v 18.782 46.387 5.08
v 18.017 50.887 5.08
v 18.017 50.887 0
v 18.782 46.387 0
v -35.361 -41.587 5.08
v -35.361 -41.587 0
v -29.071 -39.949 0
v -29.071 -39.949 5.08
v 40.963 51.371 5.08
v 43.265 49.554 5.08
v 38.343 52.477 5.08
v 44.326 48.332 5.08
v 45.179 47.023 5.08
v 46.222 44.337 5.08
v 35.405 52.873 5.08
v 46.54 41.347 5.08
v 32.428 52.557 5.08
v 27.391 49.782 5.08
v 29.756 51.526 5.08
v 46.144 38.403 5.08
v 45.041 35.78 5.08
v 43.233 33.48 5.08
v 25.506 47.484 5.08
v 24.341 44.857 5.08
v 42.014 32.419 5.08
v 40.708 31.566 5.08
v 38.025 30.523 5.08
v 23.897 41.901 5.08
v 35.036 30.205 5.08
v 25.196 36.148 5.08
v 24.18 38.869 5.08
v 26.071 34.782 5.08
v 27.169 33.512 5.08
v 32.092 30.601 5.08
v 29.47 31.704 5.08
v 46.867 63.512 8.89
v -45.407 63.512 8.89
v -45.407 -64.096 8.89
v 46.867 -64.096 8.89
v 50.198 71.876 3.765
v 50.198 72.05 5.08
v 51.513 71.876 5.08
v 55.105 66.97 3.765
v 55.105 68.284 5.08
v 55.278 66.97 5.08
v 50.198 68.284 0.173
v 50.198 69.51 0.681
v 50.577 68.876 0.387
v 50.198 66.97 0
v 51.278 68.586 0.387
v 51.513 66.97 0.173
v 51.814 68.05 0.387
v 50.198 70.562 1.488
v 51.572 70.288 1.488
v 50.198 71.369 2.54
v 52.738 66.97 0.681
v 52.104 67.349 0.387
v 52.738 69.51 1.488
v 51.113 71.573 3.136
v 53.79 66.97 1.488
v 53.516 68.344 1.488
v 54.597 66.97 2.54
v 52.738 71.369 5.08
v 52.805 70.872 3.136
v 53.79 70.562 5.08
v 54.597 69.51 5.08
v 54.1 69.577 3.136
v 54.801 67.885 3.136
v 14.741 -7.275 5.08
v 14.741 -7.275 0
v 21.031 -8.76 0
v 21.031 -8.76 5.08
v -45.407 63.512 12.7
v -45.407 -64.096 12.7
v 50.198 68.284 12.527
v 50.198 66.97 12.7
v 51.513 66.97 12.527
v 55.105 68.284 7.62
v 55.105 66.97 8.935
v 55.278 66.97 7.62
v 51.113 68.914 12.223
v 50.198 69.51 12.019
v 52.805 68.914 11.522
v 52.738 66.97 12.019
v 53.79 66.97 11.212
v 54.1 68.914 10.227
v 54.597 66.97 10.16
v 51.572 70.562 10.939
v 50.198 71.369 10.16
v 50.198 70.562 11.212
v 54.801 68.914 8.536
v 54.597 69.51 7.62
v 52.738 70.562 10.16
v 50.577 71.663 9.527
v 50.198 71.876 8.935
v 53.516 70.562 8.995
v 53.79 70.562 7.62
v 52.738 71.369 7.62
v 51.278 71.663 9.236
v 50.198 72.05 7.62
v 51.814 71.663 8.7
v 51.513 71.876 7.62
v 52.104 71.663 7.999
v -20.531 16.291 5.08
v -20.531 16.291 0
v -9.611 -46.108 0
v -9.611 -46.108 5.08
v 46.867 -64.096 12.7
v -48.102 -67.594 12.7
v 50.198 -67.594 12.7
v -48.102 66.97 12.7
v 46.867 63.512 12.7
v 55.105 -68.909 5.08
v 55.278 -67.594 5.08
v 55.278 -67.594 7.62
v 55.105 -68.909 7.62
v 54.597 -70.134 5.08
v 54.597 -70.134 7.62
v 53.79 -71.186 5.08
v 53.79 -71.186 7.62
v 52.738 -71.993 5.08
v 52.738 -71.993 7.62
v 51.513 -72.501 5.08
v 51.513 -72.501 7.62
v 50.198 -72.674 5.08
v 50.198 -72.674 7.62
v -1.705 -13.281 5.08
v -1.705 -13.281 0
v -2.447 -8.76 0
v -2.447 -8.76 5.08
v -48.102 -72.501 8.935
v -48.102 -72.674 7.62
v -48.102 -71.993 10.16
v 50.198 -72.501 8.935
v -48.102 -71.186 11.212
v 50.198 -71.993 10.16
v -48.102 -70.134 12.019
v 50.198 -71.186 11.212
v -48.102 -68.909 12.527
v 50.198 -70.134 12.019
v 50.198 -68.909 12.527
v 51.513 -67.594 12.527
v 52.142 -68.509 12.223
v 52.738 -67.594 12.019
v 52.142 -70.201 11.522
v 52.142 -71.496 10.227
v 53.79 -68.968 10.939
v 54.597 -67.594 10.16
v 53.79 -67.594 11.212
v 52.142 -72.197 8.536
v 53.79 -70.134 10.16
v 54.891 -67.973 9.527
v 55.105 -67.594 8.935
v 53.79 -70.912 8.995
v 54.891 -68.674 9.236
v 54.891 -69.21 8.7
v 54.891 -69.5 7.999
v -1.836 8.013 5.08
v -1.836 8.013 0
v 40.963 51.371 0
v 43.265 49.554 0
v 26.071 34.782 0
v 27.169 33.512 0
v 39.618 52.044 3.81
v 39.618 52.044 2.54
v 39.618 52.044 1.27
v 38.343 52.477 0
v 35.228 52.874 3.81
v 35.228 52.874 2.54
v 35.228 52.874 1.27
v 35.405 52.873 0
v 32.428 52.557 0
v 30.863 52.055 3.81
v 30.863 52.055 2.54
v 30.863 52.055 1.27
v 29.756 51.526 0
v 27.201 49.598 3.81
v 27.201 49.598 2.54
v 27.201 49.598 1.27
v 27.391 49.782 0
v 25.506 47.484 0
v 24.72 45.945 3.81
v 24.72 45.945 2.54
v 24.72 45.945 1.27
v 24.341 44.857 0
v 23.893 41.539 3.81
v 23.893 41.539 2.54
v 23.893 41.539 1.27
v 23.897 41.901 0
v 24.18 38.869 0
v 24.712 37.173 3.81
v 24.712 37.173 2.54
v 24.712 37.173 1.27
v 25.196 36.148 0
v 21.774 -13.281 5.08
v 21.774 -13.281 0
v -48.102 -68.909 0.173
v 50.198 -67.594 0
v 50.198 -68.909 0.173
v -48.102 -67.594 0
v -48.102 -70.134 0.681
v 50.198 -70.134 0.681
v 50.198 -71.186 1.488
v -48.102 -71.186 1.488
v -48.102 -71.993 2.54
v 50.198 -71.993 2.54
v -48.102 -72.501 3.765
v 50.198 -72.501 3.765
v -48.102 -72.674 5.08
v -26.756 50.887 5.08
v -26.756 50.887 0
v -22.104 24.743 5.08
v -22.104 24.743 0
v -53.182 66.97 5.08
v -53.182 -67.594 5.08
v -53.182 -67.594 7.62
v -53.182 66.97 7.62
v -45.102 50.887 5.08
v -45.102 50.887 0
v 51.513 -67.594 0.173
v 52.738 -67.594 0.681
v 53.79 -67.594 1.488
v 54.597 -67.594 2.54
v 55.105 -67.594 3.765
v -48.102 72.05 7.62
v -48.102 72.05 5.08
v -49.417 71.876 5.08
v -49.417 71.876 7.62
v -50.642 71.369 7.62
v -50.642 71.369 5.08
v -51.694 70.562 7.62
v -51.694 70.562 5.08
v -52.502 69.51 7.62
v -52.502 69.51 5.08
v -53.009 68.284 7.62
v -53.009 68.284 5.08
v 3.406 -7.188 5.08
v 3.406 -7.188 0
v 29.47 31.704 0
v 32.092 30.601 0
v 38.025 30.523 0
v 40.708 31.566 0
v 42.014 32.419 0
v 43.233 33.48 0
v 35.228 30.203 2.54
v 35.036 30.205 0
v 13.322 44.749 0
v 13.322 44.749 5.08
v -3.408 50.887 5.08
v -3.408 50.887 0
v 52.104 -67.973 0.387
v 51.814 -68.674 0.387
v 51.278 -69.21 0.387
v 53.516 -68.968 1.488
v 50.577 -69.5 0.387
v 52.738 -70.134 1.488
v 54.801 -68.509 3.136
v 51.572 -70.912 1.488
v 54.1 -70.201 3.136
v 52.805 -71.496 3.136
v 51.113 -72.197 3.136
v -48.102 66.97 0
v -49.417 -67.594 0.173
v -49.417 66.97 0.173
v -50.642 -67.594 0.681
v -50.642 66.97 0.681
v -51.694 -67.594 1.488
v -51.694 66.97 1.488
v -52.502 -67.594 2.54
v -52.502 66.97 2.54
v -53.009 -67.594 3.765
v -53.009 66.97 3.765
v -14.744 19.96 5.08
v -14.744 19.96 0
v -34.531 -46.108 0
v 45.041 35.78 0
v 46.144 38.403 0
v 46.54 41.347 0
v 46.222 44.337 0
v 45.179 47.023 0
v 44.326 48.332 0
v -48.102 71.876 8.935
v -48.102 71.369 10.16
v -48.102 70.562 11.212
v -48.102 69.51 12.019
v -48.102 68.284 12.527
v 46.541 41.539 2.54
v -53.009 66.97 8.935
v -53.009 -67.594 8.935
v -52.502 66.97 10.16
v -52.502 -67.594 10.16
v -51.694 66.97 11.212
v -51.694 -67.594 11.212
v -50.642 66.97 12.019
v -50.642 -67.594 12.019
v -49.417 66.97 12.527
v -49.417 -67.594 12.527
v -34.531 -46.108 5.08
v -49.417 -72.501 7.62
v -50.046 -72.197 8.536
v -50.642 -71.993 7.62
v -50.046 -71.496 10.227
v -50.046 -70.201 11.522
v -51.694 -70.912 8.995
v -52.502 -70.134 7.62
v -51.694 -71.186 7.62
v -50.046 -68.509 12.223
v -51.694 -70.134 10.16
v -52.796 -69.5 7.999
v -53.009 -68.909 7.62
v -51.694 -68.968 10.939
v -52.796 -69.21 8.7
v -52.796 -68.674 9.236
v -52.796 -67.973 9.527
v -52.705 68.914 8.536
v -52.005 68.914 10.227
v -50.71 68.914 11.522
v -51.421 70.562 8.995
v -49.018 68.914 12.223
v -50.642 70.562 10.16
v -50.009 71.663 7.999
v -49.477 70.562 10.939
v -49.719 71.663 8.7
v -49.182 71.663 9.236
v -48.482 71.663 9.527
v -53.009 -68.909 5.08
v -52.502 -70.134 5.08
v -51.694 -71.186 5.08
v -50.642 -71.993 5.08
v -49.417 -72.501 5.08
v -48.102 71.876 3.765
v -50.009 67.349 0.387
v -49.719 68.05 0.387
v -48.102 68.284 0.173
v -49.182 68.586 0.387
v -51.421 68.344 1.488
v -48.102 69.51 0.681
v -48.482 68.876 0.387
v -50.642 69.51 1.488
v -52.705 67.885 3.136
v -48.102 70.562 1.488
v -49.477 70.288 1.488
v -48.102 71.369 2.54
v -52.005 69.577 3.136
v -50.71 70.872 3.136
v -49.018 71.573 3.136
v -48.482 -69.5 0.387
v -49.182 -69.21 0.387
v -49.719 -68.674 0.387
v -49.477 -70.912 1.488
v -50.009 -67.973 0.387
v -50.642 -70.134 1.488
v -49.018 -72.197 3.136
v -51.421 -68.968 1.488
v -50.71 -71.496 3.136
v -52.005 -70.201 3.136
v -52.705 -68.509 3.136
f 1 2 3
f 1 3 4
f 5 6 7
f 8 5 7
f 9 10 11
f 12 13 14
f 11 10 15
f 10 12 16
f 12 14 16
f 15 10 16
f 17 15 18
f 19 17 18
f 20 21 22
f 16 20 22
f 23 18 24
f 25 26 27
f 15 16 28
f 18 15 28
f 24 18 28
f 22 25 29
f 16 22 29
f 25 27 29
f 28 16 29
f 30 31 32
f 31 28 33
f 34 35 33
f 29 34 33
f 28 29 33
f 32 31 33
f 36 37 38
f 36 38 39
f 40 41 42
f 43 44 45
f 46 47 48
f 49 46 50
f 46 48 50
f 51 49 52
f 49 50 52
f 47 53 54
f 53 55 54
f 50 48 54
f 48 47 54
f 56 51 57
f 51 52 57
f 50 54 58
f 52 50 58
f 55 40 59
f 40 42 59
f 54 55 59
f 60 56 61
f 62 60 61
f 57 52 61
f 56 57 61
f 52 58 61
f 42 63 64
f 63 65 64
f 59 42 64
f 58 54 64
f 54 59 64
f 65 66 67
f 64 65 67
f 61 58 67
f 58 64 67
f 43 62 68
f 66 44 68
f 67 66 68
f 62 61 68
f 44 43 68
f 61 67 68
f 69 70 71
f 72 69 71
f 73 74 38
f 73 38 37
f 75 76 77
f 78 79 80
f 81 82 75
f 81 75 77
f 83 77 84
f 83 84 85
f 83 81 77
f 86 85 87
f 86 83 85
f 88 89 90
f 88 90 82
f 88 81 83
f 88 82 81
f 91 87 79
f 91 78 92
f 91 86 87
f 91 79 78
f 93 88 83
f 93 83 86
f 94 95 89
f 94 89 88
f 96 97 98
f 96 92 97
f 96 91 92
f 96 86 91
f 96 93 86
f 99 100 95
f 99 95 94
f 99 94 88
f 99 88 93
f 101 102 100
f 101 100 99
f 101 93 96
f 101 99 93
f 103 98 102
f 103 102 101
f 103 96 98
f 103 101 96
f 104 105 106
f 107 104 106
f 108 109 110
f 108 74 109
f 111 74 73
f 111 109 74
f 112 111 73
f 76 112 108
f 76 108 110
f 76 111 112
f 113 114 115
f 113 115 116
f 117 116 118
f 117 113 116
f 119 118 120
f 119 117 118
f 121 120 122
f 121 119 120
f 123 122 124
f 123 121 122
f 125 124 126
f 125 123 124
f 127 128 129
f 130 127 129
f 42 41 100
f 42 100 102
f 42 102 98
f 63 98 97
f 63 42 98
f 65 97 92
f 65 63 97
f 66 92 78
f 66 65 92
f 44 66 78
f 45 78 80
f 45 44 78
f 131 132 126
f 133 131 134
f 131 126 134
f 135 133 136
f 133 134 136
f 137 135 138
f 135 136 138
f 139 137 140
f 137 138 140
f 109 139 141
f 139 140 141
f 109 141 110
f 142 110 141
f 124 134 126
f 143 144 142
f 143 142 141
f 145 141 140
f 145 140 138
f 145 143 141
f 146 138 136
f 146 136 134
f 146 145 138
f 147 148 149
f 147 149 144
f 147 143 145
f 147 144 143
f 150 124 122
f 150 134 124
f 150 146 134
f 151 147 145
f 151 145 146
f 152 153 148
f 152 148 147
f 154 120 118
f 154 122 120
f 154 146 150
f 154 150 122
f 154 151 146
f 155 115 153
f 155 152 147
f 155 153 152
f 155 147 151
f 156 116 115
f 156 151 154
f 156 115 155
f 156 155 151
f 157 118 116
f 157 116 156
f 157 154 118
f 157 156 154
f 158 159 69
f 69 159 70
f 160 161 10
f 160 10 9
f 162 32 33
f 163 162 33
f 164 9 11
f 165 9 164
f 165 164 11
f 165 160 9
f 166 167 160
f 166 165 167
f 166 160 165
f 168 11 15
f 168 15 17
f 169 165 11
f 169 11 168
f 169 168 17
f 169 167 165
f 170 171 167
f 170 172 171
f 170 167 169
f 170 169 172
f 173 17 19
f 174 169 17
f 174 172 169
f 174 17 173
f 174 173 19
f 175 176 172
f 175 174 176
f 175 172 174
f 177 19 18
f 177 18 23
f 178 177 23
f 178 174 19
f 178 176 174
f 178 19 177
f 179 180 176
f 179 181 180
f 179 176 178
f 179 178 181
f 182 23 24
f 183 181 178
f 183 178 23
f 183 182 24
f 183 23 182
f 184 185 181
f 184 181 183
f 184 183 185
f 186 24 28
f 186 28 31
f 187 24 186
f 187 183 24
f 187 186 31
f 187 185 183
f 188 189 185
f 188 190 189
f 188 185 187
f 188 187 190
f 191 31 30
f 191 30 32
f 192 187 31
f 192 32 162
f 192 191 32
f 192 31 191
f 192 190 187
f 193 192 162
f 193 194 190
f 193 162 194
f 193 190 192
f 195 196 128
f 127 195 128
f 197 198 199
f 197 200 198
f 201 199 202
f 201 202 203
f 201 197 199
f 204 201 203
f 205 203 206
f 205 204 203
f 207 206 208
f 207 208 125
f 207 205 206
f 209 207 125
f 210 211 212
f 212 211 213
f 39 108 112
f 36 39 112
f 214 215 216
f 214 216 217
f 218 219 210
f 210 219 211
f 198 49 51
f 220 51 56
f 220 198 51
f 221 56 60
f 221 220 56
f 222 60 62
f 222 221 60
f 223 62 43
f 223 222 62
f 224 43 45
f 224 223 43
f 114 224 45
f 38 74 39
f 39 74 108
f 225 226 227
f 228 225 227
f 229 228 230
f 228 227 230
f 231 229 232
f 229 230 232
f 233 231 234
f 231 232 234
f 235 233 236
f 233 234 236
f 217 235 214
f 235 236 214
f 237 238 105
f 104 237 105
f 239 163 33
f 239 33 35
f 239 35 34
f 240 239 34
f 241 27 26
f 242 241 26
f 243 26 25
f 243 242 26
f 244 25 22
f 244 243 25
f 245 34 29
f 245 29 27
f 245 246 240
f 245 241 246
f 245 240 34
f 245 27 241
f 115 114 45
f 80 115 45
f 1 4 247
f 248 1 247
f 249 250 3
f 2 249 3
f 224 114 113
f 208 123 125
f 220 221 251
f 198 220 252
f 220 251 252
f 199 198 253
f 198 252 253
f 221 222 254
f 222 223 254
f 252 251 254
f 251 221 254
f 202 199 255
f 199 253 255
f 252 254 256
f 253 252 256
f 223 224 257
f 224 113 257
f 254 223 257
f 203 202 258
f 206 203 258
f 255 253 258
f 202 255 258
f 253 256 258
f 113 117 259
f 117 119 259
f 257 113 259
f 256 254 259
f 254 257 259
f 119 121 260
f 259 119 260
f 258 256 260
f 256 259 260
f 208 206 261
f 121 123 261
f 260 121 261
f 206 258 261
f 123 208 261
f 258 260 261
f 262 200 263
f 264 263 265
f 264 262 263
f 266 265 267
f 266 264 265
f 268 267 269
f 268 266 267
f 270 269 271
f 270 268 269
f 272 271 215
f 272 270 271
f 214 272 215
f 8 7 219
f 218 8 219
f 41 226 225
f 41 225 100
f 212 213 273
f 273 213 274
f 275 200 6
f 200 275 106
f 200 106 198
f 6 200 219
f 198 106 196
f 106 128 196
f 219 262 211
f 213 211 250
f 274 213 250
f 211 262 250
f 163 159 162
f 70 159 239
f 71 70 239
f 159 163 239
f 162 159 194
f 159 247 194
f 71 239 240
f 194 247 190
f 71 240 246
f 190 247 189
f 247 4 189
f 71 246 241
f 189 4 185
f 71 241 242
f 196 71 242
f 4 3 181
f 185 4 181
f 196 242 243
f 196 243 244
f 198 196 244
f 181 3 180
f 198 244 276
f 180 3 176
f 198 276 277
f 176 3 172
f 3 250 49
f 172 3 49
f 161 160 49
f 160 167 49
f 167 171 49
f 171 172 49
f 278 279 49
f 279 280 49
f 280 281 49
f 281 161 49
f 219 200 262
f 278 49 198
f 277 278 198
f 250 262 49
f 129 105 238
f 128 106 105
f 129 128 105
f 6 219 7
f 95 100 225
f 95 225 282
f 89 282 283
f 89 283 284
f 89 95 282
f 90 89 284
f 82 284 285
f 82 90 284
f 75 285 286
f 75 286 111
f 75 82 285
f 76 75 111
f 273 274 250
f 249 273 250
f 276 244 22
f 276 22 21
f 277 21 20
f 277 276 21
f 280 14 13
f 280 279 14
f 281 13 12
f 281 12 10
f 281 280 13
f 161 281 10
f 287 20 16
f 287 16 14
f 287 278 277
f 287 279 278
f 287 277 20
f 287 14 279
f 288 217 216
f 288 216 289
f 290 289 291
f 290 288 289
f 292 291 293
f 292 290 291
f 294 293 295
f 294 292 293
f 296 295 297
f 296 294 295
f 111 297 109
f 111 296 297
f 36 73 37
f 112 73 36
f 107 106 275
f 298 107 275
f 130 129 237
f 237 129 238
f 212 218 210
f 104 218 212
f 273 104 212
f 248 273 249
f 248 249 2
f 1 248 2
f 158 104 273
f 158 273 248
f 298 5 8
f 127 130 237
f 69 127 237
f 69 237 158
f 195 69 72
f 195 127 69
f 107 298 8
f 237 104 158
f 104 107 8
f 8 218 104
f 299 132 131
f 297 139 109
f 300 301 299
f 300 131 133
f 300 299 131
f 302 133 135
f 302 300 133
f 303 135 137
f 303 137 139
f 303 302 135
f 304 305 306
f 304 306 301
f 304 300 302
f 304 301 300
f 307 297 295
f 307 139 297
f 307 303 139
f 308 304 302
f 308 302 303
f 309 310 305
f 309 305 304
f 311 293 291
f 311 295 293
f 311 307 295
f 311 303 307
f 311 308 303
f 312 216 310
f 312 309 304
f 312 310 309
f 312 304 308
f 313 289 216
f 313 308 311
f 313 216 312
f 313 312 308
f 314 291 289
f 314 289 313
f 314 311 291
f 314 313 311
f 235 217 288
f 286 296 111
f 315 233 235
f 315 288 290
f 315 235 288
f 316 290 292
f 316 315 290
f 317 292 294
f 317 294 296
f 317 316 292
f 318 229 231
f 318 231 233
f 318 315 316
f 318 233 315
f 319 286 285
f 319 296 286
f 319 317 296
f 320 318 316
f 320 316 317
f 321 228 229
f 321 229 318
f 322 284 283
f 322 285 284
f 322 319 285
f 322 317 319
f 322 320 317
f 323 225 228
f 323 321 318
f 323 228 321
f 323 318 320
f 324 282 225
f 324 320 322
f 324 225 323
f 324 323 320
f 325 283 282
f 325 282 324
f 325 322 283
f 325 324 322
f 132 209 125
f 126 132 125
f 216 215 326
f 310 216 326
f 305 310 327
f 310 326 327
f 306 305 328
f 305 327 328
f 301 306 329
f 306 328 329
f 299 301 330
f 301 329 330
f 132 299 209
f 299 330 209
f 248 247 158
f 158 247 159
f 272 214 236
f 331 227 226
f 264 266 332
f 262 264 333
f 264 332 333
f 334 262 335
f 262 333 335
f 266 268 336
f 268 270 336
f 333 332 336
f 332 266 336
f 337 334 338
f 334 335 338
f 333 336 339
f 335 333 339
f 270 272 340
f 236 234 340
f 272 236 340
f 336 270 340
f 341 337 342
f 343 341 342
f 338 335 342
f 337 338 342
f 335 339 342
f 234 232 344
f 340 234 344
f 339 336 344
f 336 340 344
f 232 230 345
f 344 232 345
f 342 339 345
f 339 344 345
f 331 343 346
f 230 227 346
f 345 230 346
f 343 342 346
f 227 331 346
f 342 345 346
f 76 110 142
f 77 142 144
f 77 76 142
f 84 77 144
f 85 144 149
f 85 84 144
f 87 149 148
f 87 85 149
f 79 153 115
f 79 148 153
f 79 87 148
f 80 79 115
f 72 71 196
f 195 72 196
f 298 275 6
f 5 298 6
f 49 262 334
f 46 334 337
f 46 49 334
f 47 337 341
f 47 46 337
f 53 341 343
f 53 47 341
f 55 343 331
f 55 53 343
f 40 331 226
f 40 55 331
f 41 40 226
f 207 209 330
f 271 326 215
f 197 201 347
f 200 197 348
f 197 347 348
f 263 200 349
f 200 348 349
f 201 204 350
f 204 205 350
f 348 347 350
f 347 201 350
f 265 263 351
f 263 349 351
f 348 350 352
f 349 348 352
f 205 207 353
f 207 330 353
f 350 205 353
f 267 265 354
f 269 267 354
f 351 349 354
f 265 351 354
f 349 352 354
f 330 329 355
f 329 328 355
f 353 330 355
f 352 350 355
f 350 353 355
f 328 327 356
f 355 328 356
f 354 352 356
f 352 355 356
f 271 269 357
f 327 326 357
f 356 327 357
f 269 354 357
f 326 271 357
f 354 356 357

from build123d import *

# Parameters (mm, degrees)
F0_W         = 108.4600649774
F0_H         = 144.723303616
F1_DEPTH     = 12.7
F2_W         = 92.2743044794
F2_H         = 127.6071891189
F3_DEPTH     = 3.81
F4_R         = 5.08
F5_T1_DEPTH  = 20.32
F5_S5_W      = 5.08
F5_S5_H      = 5.08
F5_T6_DEPTH  = 5.08
F5_S11_W     = 5.08
F5_S11_H     = 5.08
F5_T12_DEPTH = 5.08
F5_S17_W     = 5.08
F5_S17_H     = 5.08
F5_T18_DEPTH = 5.08
F5_S23_W     = 5.08
F5_S23_H     = 5.08
F5_T24_DEPTH = 5.08
F7_DEPTH     = 5.08
F8_DEPTH     = 5.08
F9_R         = 5.08


# Not quite as in the source:
# - a fillet or chamfer that OpenCascade refuses, or shapes differently, is made with other operations: its cross-section is extruded or revolved along the edge and cut away or added


with BuildPart() as f1:
    # F0 (on Top) → F1 (new body)
    with BuildSketch(Plane.XY):
        with Locations((1.0477285832, -0.3120861948)):
            Rectangle(F0_W, F0_H)
    extrude(amount=F1_DEPTH)

    # F2 (on face) → F3 (cut, symmetric)
    with BuildSketch(Plane.XY.offset(12.7)):
        with Locations((0.7300172001, -0.29200688)):
            Rectangle(F2_W, F2_H)
    extrude(amount=F3_DEPTH, both=True, mode=Mode.SUBTRACT)

    # F4
    f4_edges = [f1.edges().sort_by_distance(p)[0] for p in [
        (1.047729, 72.049566, 12.7),
        (-53.182304, -0.312086, 12.7),
        (55.277761, -0.312086, 12.7),
        (1.047729, -72.673738, 12.7),
    ]]
    fillet(f4_edges, radius=F4_R)

    # F5: fillet of radius 5.08 on 4 edges, made by hand

    # F5_s2 → F5_t1 (cut)
    with BuildSketch(Plane.XY.offset(-12.7)):
        with BuildLine():
            ThreePointArc((-48.1023039055, 72.0495656133), (-51.6944063539, 70.5616680617), (-53.1823039055, 66.9695656133))
            Line((-53.1823039055, 66.9695656133), (-53.1823039055, 72.0495656133))
            Line((-53.1823039055, 72.0495656133), (-48.1023039055, 72.0495656133))
        make_face()
        with BuildLine():
            ThreePointArc((55.2777610719, -67.5937380028), (53.7898635203, -71.1858404512), (50.1977610719, -72.6737380028))
            Line((50.1977610719, -72.6737380028), (55.2777610719, -72.6737380028))
            Line((55.2777610719, -72.6737380028), (55.2777610719, -67.5937380028))
        make_face()
        with BuildLine():
            ThreePointArc((50.1977610719, 72.0495656133), (53.7898635203, 70.5616680617), (55.2777610719, 66.9695656133))
            Line((55.2777610719, 66.9695656133), (55.2777610719, 72.0495656133))
            Line((55.2777610719, 72.0495656133), (50.1977610719, 72.0495656133))
        make_face()
        with BuildLine():
            ThreePointArc((-53.1823039055, -67.5937380028), (-51.6944063539, -71.1858404512), (-48.1023039055, -72.6737380028))
            Line((-48.1023039055, -72.6737380028), (-53.1823039055, -72.6737380028))
            Line((-53.1823039055, -72.6737380028), (-53.1823039055, -67.5937380028))
        make_face()
    extrude(amount=F5_T1_DEPTH, mode=Mode.SUBTRACT)


with BuildPart() as f5_tool4:
    # F5_s5 → F5_t6 (new body)
    with BuildSketch(Plane.YZ.offset(-48.1023039055)):
        with Locations((-70.1337380028, 10.16)):
            Rectangle(F5_S5_W, F5_S5_H)
    extrude(amount=-F5_T6_DEPTH)

    # F5_s7 → F5_t8 (revolve, cut)
    with BuildSketch(Plane(origin=(-48.1023039055, -67.5937380028, 7.62), x_dir=(0, 0.7071067812, -0.7071067812), z_dir=(0, 0.7071067812, 0.7071067812))):
        with BuildLine():
            ThreePointArc((0, -5.08), (5.08, 0), (0, 5.08))
            Line((0, 5.08), (0, -5.08))
        make_face()
    revolve(axis=Axis((-48.1023039055, -67.5937380028, 7.62), (-1, 0, 0)), mode=Mode.SUBTRACT)


with BuildPart() as f1_1:
    add(f1.part)

    # F5_t3: cut F5_tool4
    add(f5_tool4.part, mode=Mode.SUBTRACT)


with BuildPart() as f5_tool10:
    # F5_s11 → F5_t12 (new body)
    with BuildSketch(Plane.XZ.offset(-66.9695656133)):
        with Locations((52.7377610719, 10.16)):
            Rectangle(F5_S11_W, F5_S11_H)
    extrude(amount=-F5_T12_DEPTH)

    # F5_s13 → F5_t14 (revolve, cut)
    with BuildSketch(Plane(origin=(50.1977610719, 66.9695656133, 7.62), x_dir=(-0.7071067812, 0, -0.7071067812), z_dir=(0.7071067812, 0, -0.7071067812))):
        with BuildLine():
            ThreePointArc((0, -5.08), (5.08, 0), (0, 5.08))
            Line((0, 5.08), (0, -5.08))
        make_face()
    revolve(axis=Axis((50.1977610719, 66.9695656133, 7.62), (0, 1, 0)), mode=Mode.SUBTRACT)


with BuildPart() as f1_2:
    add(f1_1.part)

    # F5_t9: cut F5_tool10
    add(f5_tool10.part, mode=Mode.SUBTRACT)


with BuildPart() as f5_tool16:
    # F5_s17 → F5_t18 (new body)
    with BuildSketch(Plane.YZ.offset(50.1977610719)):
        with Locations((-70.1337380028, 10.16)):
            Rectangle(F5_S17_W, F5_S17_H)
    extrude(amount=F5_T18_DEPTH)

    # F5_s19 → F5_t20 (revolve, cut)
    with BuildSketch(Plane(origin=(50.1977610719, -67.5937380028, 7.62), x_dir=(0, 0.7071067812, -0.7071067812), z_dir=(0, -0.7071067812, -0.7071067812))):
        with BuildLine():
            ThreePointArc((0, -5.08), (5.08, 0), (0, 5.08))
            Line((0, 5.08), (0, -5.08))
        make_face()
    revolve(axis=Axis((50.1977610719, -67.5937380028, 7.62), (1, 0, 0)), mode=Mode.SUBTRACT)


with BuildPart() as f1_3:
    add(f1_2.part)

    # F5_t15: cut F5_tool16
    add(f5_tool16.part, mode=Mode.SUBTRACT)


with BuildPart() as f5_tool22:
    # F5_s23 → F5_t24 (new body)
    with BuildSketch(Plane.XZ.offset(-66.9695656133)):
        with Locations((-50.6423039055, 10.16)):
            Rectangle(F5_S23_W, F5_S23_H)
    extrude(amount=-F5_T24_DEPTH)

    # F5_s25 → F5_t26 (revolve, cut)
    with BuildSketch(Plane(origin=(-48.1023039055, 66.9695656133, 7.62), x_dir=(0.7071067812, 0, -0.7071067812), z_dir=(0.7071067812, 0, 0.7071067812))):
        with BuildLine():
            ThreePointArc((0, -5.08), (5.08, 0), (0, 5.08))
            Line((0, 5.08), (0, -5.08))
        make_face()
    revolve(axis=Axis((-48.1023039055, 66.9695656133, 7.62), (0, 1, 0)), mode=Mode.SUBTRACT)


with BuildPart() as f1_4:
    add(f1_3.part)

    # F5_t21: cut F5_tool22
    add(f5_tool22.part, mode=Mode.SUBTRACT)

    # F6 (on face) → F7 (cut)
    with BuildSketch(Plane(origin=(0, 0, 0), x_dir=(1, 0, 0), z_dir=(0, 0, -1))):
        Polygon((3.4059861085, 7.1879082529), (-20.5314729904, -16.2908951516), (-9.6110993139, 46.108120036), (-34.5313920437, 46.108120036), (-35.3613404431, 41.5870853339), (-29.0712052055, 39.9490292824), (-45.1023137626, -50.8866389588), (-26.7560859861, -50.8866389588), (-22.1040067999, -24.7432643772), (-14.7436749419, -19.9601407069), (-3.4083270657, -50.8866389588), (18.0174460877, -50.8866389588), (18.781872245, -46.3874450041), (13.3216854068, -44.7493889526), (-1.8357932562, -8.0132519048), (14.7413339847, 7.2752712423), (21.0314692224, 8.7604420623), (21.7740546324, 13.2814767644), (-1.7047487721, 13.2814767644), (-2.4473341821, 8.7604420623), align=None)
    extrude(amount=-F7_DEPTH, mode=Mode.SUBTRACT)

    # F6 (on face) → F8 (cut)
    with BuildSketch(Plane(origin=(0, 0, 0), x_dir=(1, 0, 0), z_dir=(0, 0, -1))):
        with BuildLine():
            add(Edge.make_bspline(
                [(35.2279550018, -52.874146968), (30.5103535736, -52.874146968), (27.2014803496, -49.598034865)],
                knots=[0, 0, 0, 1, 1, 1], degree=2))
            add(Edge.make_bspline(
                [(43.2653500278, -49.5543533703), (39.9892379248, -52.874146968), (35.2279550018, -52.874146968)],
                knots=[0, 0, 0, 1, 1, 1], degree=2))
            add(Edge.make_bspline(
                [(46.5414621307, -41.5387990917), (46.5414621307, -46.2345597726), (43.2653500278, -49.5543533703)],
                knots=[0, 0, 0, 1, 1, 1], degree=2))
            add(Edge.make_bspline(
                [(43.2325889067, -33.4795633185), (46.5414621307, -36.7556754214), (46.5414621307, -41.5387990917)],
                knots=[0, 0, 0, 1, 1, 1], degree=2))
            add(Edge.make_bspline(
                [(35.2279550018, -30.2034512155), (39.9237156827, -30.2034512155), (43.2325889067, -33.4795633185)],
                knots=[0, 0, 0, 1, 1, 1], degree=2))
            add(Edge.make_bspline(
                [(27.1687192286, -33.5123244395), (30.4448313315, -30.2034512155), (35.2279550018, -30.2034512155)],
                knots=[0, 0, 0, 1, 1, 1], degree=2))
            add(Edge.make_bspline(
                [(23.8926071256, -41.5387990917), (23.8926071256, -36.8211976635), (27.1687192286, -33.5123244395)],
                knots=[0, 0, 0, 1, 1, 1], degree=2))
            add(Edge.make_bspline(
                [(27.2014803496, -49.598034865), (23.8926071256, -46.321922762), (23.8926071256, -41.5387990917)],
                knots=[0, 0, 0, 1, 1, 1], degree=2))
        make_face()
    extrude(amount=-F8_DEPTH, mode=Mode.SUBTRACT)

    # F9
    f9_edges = [f1_4.edges().sort_by_distance(p)[0] for p in [
        (-51.694406, -71.18584, 0),
    ]]
    fillet(f9_edges, radius=F9_R)


solid = f1_4.part
